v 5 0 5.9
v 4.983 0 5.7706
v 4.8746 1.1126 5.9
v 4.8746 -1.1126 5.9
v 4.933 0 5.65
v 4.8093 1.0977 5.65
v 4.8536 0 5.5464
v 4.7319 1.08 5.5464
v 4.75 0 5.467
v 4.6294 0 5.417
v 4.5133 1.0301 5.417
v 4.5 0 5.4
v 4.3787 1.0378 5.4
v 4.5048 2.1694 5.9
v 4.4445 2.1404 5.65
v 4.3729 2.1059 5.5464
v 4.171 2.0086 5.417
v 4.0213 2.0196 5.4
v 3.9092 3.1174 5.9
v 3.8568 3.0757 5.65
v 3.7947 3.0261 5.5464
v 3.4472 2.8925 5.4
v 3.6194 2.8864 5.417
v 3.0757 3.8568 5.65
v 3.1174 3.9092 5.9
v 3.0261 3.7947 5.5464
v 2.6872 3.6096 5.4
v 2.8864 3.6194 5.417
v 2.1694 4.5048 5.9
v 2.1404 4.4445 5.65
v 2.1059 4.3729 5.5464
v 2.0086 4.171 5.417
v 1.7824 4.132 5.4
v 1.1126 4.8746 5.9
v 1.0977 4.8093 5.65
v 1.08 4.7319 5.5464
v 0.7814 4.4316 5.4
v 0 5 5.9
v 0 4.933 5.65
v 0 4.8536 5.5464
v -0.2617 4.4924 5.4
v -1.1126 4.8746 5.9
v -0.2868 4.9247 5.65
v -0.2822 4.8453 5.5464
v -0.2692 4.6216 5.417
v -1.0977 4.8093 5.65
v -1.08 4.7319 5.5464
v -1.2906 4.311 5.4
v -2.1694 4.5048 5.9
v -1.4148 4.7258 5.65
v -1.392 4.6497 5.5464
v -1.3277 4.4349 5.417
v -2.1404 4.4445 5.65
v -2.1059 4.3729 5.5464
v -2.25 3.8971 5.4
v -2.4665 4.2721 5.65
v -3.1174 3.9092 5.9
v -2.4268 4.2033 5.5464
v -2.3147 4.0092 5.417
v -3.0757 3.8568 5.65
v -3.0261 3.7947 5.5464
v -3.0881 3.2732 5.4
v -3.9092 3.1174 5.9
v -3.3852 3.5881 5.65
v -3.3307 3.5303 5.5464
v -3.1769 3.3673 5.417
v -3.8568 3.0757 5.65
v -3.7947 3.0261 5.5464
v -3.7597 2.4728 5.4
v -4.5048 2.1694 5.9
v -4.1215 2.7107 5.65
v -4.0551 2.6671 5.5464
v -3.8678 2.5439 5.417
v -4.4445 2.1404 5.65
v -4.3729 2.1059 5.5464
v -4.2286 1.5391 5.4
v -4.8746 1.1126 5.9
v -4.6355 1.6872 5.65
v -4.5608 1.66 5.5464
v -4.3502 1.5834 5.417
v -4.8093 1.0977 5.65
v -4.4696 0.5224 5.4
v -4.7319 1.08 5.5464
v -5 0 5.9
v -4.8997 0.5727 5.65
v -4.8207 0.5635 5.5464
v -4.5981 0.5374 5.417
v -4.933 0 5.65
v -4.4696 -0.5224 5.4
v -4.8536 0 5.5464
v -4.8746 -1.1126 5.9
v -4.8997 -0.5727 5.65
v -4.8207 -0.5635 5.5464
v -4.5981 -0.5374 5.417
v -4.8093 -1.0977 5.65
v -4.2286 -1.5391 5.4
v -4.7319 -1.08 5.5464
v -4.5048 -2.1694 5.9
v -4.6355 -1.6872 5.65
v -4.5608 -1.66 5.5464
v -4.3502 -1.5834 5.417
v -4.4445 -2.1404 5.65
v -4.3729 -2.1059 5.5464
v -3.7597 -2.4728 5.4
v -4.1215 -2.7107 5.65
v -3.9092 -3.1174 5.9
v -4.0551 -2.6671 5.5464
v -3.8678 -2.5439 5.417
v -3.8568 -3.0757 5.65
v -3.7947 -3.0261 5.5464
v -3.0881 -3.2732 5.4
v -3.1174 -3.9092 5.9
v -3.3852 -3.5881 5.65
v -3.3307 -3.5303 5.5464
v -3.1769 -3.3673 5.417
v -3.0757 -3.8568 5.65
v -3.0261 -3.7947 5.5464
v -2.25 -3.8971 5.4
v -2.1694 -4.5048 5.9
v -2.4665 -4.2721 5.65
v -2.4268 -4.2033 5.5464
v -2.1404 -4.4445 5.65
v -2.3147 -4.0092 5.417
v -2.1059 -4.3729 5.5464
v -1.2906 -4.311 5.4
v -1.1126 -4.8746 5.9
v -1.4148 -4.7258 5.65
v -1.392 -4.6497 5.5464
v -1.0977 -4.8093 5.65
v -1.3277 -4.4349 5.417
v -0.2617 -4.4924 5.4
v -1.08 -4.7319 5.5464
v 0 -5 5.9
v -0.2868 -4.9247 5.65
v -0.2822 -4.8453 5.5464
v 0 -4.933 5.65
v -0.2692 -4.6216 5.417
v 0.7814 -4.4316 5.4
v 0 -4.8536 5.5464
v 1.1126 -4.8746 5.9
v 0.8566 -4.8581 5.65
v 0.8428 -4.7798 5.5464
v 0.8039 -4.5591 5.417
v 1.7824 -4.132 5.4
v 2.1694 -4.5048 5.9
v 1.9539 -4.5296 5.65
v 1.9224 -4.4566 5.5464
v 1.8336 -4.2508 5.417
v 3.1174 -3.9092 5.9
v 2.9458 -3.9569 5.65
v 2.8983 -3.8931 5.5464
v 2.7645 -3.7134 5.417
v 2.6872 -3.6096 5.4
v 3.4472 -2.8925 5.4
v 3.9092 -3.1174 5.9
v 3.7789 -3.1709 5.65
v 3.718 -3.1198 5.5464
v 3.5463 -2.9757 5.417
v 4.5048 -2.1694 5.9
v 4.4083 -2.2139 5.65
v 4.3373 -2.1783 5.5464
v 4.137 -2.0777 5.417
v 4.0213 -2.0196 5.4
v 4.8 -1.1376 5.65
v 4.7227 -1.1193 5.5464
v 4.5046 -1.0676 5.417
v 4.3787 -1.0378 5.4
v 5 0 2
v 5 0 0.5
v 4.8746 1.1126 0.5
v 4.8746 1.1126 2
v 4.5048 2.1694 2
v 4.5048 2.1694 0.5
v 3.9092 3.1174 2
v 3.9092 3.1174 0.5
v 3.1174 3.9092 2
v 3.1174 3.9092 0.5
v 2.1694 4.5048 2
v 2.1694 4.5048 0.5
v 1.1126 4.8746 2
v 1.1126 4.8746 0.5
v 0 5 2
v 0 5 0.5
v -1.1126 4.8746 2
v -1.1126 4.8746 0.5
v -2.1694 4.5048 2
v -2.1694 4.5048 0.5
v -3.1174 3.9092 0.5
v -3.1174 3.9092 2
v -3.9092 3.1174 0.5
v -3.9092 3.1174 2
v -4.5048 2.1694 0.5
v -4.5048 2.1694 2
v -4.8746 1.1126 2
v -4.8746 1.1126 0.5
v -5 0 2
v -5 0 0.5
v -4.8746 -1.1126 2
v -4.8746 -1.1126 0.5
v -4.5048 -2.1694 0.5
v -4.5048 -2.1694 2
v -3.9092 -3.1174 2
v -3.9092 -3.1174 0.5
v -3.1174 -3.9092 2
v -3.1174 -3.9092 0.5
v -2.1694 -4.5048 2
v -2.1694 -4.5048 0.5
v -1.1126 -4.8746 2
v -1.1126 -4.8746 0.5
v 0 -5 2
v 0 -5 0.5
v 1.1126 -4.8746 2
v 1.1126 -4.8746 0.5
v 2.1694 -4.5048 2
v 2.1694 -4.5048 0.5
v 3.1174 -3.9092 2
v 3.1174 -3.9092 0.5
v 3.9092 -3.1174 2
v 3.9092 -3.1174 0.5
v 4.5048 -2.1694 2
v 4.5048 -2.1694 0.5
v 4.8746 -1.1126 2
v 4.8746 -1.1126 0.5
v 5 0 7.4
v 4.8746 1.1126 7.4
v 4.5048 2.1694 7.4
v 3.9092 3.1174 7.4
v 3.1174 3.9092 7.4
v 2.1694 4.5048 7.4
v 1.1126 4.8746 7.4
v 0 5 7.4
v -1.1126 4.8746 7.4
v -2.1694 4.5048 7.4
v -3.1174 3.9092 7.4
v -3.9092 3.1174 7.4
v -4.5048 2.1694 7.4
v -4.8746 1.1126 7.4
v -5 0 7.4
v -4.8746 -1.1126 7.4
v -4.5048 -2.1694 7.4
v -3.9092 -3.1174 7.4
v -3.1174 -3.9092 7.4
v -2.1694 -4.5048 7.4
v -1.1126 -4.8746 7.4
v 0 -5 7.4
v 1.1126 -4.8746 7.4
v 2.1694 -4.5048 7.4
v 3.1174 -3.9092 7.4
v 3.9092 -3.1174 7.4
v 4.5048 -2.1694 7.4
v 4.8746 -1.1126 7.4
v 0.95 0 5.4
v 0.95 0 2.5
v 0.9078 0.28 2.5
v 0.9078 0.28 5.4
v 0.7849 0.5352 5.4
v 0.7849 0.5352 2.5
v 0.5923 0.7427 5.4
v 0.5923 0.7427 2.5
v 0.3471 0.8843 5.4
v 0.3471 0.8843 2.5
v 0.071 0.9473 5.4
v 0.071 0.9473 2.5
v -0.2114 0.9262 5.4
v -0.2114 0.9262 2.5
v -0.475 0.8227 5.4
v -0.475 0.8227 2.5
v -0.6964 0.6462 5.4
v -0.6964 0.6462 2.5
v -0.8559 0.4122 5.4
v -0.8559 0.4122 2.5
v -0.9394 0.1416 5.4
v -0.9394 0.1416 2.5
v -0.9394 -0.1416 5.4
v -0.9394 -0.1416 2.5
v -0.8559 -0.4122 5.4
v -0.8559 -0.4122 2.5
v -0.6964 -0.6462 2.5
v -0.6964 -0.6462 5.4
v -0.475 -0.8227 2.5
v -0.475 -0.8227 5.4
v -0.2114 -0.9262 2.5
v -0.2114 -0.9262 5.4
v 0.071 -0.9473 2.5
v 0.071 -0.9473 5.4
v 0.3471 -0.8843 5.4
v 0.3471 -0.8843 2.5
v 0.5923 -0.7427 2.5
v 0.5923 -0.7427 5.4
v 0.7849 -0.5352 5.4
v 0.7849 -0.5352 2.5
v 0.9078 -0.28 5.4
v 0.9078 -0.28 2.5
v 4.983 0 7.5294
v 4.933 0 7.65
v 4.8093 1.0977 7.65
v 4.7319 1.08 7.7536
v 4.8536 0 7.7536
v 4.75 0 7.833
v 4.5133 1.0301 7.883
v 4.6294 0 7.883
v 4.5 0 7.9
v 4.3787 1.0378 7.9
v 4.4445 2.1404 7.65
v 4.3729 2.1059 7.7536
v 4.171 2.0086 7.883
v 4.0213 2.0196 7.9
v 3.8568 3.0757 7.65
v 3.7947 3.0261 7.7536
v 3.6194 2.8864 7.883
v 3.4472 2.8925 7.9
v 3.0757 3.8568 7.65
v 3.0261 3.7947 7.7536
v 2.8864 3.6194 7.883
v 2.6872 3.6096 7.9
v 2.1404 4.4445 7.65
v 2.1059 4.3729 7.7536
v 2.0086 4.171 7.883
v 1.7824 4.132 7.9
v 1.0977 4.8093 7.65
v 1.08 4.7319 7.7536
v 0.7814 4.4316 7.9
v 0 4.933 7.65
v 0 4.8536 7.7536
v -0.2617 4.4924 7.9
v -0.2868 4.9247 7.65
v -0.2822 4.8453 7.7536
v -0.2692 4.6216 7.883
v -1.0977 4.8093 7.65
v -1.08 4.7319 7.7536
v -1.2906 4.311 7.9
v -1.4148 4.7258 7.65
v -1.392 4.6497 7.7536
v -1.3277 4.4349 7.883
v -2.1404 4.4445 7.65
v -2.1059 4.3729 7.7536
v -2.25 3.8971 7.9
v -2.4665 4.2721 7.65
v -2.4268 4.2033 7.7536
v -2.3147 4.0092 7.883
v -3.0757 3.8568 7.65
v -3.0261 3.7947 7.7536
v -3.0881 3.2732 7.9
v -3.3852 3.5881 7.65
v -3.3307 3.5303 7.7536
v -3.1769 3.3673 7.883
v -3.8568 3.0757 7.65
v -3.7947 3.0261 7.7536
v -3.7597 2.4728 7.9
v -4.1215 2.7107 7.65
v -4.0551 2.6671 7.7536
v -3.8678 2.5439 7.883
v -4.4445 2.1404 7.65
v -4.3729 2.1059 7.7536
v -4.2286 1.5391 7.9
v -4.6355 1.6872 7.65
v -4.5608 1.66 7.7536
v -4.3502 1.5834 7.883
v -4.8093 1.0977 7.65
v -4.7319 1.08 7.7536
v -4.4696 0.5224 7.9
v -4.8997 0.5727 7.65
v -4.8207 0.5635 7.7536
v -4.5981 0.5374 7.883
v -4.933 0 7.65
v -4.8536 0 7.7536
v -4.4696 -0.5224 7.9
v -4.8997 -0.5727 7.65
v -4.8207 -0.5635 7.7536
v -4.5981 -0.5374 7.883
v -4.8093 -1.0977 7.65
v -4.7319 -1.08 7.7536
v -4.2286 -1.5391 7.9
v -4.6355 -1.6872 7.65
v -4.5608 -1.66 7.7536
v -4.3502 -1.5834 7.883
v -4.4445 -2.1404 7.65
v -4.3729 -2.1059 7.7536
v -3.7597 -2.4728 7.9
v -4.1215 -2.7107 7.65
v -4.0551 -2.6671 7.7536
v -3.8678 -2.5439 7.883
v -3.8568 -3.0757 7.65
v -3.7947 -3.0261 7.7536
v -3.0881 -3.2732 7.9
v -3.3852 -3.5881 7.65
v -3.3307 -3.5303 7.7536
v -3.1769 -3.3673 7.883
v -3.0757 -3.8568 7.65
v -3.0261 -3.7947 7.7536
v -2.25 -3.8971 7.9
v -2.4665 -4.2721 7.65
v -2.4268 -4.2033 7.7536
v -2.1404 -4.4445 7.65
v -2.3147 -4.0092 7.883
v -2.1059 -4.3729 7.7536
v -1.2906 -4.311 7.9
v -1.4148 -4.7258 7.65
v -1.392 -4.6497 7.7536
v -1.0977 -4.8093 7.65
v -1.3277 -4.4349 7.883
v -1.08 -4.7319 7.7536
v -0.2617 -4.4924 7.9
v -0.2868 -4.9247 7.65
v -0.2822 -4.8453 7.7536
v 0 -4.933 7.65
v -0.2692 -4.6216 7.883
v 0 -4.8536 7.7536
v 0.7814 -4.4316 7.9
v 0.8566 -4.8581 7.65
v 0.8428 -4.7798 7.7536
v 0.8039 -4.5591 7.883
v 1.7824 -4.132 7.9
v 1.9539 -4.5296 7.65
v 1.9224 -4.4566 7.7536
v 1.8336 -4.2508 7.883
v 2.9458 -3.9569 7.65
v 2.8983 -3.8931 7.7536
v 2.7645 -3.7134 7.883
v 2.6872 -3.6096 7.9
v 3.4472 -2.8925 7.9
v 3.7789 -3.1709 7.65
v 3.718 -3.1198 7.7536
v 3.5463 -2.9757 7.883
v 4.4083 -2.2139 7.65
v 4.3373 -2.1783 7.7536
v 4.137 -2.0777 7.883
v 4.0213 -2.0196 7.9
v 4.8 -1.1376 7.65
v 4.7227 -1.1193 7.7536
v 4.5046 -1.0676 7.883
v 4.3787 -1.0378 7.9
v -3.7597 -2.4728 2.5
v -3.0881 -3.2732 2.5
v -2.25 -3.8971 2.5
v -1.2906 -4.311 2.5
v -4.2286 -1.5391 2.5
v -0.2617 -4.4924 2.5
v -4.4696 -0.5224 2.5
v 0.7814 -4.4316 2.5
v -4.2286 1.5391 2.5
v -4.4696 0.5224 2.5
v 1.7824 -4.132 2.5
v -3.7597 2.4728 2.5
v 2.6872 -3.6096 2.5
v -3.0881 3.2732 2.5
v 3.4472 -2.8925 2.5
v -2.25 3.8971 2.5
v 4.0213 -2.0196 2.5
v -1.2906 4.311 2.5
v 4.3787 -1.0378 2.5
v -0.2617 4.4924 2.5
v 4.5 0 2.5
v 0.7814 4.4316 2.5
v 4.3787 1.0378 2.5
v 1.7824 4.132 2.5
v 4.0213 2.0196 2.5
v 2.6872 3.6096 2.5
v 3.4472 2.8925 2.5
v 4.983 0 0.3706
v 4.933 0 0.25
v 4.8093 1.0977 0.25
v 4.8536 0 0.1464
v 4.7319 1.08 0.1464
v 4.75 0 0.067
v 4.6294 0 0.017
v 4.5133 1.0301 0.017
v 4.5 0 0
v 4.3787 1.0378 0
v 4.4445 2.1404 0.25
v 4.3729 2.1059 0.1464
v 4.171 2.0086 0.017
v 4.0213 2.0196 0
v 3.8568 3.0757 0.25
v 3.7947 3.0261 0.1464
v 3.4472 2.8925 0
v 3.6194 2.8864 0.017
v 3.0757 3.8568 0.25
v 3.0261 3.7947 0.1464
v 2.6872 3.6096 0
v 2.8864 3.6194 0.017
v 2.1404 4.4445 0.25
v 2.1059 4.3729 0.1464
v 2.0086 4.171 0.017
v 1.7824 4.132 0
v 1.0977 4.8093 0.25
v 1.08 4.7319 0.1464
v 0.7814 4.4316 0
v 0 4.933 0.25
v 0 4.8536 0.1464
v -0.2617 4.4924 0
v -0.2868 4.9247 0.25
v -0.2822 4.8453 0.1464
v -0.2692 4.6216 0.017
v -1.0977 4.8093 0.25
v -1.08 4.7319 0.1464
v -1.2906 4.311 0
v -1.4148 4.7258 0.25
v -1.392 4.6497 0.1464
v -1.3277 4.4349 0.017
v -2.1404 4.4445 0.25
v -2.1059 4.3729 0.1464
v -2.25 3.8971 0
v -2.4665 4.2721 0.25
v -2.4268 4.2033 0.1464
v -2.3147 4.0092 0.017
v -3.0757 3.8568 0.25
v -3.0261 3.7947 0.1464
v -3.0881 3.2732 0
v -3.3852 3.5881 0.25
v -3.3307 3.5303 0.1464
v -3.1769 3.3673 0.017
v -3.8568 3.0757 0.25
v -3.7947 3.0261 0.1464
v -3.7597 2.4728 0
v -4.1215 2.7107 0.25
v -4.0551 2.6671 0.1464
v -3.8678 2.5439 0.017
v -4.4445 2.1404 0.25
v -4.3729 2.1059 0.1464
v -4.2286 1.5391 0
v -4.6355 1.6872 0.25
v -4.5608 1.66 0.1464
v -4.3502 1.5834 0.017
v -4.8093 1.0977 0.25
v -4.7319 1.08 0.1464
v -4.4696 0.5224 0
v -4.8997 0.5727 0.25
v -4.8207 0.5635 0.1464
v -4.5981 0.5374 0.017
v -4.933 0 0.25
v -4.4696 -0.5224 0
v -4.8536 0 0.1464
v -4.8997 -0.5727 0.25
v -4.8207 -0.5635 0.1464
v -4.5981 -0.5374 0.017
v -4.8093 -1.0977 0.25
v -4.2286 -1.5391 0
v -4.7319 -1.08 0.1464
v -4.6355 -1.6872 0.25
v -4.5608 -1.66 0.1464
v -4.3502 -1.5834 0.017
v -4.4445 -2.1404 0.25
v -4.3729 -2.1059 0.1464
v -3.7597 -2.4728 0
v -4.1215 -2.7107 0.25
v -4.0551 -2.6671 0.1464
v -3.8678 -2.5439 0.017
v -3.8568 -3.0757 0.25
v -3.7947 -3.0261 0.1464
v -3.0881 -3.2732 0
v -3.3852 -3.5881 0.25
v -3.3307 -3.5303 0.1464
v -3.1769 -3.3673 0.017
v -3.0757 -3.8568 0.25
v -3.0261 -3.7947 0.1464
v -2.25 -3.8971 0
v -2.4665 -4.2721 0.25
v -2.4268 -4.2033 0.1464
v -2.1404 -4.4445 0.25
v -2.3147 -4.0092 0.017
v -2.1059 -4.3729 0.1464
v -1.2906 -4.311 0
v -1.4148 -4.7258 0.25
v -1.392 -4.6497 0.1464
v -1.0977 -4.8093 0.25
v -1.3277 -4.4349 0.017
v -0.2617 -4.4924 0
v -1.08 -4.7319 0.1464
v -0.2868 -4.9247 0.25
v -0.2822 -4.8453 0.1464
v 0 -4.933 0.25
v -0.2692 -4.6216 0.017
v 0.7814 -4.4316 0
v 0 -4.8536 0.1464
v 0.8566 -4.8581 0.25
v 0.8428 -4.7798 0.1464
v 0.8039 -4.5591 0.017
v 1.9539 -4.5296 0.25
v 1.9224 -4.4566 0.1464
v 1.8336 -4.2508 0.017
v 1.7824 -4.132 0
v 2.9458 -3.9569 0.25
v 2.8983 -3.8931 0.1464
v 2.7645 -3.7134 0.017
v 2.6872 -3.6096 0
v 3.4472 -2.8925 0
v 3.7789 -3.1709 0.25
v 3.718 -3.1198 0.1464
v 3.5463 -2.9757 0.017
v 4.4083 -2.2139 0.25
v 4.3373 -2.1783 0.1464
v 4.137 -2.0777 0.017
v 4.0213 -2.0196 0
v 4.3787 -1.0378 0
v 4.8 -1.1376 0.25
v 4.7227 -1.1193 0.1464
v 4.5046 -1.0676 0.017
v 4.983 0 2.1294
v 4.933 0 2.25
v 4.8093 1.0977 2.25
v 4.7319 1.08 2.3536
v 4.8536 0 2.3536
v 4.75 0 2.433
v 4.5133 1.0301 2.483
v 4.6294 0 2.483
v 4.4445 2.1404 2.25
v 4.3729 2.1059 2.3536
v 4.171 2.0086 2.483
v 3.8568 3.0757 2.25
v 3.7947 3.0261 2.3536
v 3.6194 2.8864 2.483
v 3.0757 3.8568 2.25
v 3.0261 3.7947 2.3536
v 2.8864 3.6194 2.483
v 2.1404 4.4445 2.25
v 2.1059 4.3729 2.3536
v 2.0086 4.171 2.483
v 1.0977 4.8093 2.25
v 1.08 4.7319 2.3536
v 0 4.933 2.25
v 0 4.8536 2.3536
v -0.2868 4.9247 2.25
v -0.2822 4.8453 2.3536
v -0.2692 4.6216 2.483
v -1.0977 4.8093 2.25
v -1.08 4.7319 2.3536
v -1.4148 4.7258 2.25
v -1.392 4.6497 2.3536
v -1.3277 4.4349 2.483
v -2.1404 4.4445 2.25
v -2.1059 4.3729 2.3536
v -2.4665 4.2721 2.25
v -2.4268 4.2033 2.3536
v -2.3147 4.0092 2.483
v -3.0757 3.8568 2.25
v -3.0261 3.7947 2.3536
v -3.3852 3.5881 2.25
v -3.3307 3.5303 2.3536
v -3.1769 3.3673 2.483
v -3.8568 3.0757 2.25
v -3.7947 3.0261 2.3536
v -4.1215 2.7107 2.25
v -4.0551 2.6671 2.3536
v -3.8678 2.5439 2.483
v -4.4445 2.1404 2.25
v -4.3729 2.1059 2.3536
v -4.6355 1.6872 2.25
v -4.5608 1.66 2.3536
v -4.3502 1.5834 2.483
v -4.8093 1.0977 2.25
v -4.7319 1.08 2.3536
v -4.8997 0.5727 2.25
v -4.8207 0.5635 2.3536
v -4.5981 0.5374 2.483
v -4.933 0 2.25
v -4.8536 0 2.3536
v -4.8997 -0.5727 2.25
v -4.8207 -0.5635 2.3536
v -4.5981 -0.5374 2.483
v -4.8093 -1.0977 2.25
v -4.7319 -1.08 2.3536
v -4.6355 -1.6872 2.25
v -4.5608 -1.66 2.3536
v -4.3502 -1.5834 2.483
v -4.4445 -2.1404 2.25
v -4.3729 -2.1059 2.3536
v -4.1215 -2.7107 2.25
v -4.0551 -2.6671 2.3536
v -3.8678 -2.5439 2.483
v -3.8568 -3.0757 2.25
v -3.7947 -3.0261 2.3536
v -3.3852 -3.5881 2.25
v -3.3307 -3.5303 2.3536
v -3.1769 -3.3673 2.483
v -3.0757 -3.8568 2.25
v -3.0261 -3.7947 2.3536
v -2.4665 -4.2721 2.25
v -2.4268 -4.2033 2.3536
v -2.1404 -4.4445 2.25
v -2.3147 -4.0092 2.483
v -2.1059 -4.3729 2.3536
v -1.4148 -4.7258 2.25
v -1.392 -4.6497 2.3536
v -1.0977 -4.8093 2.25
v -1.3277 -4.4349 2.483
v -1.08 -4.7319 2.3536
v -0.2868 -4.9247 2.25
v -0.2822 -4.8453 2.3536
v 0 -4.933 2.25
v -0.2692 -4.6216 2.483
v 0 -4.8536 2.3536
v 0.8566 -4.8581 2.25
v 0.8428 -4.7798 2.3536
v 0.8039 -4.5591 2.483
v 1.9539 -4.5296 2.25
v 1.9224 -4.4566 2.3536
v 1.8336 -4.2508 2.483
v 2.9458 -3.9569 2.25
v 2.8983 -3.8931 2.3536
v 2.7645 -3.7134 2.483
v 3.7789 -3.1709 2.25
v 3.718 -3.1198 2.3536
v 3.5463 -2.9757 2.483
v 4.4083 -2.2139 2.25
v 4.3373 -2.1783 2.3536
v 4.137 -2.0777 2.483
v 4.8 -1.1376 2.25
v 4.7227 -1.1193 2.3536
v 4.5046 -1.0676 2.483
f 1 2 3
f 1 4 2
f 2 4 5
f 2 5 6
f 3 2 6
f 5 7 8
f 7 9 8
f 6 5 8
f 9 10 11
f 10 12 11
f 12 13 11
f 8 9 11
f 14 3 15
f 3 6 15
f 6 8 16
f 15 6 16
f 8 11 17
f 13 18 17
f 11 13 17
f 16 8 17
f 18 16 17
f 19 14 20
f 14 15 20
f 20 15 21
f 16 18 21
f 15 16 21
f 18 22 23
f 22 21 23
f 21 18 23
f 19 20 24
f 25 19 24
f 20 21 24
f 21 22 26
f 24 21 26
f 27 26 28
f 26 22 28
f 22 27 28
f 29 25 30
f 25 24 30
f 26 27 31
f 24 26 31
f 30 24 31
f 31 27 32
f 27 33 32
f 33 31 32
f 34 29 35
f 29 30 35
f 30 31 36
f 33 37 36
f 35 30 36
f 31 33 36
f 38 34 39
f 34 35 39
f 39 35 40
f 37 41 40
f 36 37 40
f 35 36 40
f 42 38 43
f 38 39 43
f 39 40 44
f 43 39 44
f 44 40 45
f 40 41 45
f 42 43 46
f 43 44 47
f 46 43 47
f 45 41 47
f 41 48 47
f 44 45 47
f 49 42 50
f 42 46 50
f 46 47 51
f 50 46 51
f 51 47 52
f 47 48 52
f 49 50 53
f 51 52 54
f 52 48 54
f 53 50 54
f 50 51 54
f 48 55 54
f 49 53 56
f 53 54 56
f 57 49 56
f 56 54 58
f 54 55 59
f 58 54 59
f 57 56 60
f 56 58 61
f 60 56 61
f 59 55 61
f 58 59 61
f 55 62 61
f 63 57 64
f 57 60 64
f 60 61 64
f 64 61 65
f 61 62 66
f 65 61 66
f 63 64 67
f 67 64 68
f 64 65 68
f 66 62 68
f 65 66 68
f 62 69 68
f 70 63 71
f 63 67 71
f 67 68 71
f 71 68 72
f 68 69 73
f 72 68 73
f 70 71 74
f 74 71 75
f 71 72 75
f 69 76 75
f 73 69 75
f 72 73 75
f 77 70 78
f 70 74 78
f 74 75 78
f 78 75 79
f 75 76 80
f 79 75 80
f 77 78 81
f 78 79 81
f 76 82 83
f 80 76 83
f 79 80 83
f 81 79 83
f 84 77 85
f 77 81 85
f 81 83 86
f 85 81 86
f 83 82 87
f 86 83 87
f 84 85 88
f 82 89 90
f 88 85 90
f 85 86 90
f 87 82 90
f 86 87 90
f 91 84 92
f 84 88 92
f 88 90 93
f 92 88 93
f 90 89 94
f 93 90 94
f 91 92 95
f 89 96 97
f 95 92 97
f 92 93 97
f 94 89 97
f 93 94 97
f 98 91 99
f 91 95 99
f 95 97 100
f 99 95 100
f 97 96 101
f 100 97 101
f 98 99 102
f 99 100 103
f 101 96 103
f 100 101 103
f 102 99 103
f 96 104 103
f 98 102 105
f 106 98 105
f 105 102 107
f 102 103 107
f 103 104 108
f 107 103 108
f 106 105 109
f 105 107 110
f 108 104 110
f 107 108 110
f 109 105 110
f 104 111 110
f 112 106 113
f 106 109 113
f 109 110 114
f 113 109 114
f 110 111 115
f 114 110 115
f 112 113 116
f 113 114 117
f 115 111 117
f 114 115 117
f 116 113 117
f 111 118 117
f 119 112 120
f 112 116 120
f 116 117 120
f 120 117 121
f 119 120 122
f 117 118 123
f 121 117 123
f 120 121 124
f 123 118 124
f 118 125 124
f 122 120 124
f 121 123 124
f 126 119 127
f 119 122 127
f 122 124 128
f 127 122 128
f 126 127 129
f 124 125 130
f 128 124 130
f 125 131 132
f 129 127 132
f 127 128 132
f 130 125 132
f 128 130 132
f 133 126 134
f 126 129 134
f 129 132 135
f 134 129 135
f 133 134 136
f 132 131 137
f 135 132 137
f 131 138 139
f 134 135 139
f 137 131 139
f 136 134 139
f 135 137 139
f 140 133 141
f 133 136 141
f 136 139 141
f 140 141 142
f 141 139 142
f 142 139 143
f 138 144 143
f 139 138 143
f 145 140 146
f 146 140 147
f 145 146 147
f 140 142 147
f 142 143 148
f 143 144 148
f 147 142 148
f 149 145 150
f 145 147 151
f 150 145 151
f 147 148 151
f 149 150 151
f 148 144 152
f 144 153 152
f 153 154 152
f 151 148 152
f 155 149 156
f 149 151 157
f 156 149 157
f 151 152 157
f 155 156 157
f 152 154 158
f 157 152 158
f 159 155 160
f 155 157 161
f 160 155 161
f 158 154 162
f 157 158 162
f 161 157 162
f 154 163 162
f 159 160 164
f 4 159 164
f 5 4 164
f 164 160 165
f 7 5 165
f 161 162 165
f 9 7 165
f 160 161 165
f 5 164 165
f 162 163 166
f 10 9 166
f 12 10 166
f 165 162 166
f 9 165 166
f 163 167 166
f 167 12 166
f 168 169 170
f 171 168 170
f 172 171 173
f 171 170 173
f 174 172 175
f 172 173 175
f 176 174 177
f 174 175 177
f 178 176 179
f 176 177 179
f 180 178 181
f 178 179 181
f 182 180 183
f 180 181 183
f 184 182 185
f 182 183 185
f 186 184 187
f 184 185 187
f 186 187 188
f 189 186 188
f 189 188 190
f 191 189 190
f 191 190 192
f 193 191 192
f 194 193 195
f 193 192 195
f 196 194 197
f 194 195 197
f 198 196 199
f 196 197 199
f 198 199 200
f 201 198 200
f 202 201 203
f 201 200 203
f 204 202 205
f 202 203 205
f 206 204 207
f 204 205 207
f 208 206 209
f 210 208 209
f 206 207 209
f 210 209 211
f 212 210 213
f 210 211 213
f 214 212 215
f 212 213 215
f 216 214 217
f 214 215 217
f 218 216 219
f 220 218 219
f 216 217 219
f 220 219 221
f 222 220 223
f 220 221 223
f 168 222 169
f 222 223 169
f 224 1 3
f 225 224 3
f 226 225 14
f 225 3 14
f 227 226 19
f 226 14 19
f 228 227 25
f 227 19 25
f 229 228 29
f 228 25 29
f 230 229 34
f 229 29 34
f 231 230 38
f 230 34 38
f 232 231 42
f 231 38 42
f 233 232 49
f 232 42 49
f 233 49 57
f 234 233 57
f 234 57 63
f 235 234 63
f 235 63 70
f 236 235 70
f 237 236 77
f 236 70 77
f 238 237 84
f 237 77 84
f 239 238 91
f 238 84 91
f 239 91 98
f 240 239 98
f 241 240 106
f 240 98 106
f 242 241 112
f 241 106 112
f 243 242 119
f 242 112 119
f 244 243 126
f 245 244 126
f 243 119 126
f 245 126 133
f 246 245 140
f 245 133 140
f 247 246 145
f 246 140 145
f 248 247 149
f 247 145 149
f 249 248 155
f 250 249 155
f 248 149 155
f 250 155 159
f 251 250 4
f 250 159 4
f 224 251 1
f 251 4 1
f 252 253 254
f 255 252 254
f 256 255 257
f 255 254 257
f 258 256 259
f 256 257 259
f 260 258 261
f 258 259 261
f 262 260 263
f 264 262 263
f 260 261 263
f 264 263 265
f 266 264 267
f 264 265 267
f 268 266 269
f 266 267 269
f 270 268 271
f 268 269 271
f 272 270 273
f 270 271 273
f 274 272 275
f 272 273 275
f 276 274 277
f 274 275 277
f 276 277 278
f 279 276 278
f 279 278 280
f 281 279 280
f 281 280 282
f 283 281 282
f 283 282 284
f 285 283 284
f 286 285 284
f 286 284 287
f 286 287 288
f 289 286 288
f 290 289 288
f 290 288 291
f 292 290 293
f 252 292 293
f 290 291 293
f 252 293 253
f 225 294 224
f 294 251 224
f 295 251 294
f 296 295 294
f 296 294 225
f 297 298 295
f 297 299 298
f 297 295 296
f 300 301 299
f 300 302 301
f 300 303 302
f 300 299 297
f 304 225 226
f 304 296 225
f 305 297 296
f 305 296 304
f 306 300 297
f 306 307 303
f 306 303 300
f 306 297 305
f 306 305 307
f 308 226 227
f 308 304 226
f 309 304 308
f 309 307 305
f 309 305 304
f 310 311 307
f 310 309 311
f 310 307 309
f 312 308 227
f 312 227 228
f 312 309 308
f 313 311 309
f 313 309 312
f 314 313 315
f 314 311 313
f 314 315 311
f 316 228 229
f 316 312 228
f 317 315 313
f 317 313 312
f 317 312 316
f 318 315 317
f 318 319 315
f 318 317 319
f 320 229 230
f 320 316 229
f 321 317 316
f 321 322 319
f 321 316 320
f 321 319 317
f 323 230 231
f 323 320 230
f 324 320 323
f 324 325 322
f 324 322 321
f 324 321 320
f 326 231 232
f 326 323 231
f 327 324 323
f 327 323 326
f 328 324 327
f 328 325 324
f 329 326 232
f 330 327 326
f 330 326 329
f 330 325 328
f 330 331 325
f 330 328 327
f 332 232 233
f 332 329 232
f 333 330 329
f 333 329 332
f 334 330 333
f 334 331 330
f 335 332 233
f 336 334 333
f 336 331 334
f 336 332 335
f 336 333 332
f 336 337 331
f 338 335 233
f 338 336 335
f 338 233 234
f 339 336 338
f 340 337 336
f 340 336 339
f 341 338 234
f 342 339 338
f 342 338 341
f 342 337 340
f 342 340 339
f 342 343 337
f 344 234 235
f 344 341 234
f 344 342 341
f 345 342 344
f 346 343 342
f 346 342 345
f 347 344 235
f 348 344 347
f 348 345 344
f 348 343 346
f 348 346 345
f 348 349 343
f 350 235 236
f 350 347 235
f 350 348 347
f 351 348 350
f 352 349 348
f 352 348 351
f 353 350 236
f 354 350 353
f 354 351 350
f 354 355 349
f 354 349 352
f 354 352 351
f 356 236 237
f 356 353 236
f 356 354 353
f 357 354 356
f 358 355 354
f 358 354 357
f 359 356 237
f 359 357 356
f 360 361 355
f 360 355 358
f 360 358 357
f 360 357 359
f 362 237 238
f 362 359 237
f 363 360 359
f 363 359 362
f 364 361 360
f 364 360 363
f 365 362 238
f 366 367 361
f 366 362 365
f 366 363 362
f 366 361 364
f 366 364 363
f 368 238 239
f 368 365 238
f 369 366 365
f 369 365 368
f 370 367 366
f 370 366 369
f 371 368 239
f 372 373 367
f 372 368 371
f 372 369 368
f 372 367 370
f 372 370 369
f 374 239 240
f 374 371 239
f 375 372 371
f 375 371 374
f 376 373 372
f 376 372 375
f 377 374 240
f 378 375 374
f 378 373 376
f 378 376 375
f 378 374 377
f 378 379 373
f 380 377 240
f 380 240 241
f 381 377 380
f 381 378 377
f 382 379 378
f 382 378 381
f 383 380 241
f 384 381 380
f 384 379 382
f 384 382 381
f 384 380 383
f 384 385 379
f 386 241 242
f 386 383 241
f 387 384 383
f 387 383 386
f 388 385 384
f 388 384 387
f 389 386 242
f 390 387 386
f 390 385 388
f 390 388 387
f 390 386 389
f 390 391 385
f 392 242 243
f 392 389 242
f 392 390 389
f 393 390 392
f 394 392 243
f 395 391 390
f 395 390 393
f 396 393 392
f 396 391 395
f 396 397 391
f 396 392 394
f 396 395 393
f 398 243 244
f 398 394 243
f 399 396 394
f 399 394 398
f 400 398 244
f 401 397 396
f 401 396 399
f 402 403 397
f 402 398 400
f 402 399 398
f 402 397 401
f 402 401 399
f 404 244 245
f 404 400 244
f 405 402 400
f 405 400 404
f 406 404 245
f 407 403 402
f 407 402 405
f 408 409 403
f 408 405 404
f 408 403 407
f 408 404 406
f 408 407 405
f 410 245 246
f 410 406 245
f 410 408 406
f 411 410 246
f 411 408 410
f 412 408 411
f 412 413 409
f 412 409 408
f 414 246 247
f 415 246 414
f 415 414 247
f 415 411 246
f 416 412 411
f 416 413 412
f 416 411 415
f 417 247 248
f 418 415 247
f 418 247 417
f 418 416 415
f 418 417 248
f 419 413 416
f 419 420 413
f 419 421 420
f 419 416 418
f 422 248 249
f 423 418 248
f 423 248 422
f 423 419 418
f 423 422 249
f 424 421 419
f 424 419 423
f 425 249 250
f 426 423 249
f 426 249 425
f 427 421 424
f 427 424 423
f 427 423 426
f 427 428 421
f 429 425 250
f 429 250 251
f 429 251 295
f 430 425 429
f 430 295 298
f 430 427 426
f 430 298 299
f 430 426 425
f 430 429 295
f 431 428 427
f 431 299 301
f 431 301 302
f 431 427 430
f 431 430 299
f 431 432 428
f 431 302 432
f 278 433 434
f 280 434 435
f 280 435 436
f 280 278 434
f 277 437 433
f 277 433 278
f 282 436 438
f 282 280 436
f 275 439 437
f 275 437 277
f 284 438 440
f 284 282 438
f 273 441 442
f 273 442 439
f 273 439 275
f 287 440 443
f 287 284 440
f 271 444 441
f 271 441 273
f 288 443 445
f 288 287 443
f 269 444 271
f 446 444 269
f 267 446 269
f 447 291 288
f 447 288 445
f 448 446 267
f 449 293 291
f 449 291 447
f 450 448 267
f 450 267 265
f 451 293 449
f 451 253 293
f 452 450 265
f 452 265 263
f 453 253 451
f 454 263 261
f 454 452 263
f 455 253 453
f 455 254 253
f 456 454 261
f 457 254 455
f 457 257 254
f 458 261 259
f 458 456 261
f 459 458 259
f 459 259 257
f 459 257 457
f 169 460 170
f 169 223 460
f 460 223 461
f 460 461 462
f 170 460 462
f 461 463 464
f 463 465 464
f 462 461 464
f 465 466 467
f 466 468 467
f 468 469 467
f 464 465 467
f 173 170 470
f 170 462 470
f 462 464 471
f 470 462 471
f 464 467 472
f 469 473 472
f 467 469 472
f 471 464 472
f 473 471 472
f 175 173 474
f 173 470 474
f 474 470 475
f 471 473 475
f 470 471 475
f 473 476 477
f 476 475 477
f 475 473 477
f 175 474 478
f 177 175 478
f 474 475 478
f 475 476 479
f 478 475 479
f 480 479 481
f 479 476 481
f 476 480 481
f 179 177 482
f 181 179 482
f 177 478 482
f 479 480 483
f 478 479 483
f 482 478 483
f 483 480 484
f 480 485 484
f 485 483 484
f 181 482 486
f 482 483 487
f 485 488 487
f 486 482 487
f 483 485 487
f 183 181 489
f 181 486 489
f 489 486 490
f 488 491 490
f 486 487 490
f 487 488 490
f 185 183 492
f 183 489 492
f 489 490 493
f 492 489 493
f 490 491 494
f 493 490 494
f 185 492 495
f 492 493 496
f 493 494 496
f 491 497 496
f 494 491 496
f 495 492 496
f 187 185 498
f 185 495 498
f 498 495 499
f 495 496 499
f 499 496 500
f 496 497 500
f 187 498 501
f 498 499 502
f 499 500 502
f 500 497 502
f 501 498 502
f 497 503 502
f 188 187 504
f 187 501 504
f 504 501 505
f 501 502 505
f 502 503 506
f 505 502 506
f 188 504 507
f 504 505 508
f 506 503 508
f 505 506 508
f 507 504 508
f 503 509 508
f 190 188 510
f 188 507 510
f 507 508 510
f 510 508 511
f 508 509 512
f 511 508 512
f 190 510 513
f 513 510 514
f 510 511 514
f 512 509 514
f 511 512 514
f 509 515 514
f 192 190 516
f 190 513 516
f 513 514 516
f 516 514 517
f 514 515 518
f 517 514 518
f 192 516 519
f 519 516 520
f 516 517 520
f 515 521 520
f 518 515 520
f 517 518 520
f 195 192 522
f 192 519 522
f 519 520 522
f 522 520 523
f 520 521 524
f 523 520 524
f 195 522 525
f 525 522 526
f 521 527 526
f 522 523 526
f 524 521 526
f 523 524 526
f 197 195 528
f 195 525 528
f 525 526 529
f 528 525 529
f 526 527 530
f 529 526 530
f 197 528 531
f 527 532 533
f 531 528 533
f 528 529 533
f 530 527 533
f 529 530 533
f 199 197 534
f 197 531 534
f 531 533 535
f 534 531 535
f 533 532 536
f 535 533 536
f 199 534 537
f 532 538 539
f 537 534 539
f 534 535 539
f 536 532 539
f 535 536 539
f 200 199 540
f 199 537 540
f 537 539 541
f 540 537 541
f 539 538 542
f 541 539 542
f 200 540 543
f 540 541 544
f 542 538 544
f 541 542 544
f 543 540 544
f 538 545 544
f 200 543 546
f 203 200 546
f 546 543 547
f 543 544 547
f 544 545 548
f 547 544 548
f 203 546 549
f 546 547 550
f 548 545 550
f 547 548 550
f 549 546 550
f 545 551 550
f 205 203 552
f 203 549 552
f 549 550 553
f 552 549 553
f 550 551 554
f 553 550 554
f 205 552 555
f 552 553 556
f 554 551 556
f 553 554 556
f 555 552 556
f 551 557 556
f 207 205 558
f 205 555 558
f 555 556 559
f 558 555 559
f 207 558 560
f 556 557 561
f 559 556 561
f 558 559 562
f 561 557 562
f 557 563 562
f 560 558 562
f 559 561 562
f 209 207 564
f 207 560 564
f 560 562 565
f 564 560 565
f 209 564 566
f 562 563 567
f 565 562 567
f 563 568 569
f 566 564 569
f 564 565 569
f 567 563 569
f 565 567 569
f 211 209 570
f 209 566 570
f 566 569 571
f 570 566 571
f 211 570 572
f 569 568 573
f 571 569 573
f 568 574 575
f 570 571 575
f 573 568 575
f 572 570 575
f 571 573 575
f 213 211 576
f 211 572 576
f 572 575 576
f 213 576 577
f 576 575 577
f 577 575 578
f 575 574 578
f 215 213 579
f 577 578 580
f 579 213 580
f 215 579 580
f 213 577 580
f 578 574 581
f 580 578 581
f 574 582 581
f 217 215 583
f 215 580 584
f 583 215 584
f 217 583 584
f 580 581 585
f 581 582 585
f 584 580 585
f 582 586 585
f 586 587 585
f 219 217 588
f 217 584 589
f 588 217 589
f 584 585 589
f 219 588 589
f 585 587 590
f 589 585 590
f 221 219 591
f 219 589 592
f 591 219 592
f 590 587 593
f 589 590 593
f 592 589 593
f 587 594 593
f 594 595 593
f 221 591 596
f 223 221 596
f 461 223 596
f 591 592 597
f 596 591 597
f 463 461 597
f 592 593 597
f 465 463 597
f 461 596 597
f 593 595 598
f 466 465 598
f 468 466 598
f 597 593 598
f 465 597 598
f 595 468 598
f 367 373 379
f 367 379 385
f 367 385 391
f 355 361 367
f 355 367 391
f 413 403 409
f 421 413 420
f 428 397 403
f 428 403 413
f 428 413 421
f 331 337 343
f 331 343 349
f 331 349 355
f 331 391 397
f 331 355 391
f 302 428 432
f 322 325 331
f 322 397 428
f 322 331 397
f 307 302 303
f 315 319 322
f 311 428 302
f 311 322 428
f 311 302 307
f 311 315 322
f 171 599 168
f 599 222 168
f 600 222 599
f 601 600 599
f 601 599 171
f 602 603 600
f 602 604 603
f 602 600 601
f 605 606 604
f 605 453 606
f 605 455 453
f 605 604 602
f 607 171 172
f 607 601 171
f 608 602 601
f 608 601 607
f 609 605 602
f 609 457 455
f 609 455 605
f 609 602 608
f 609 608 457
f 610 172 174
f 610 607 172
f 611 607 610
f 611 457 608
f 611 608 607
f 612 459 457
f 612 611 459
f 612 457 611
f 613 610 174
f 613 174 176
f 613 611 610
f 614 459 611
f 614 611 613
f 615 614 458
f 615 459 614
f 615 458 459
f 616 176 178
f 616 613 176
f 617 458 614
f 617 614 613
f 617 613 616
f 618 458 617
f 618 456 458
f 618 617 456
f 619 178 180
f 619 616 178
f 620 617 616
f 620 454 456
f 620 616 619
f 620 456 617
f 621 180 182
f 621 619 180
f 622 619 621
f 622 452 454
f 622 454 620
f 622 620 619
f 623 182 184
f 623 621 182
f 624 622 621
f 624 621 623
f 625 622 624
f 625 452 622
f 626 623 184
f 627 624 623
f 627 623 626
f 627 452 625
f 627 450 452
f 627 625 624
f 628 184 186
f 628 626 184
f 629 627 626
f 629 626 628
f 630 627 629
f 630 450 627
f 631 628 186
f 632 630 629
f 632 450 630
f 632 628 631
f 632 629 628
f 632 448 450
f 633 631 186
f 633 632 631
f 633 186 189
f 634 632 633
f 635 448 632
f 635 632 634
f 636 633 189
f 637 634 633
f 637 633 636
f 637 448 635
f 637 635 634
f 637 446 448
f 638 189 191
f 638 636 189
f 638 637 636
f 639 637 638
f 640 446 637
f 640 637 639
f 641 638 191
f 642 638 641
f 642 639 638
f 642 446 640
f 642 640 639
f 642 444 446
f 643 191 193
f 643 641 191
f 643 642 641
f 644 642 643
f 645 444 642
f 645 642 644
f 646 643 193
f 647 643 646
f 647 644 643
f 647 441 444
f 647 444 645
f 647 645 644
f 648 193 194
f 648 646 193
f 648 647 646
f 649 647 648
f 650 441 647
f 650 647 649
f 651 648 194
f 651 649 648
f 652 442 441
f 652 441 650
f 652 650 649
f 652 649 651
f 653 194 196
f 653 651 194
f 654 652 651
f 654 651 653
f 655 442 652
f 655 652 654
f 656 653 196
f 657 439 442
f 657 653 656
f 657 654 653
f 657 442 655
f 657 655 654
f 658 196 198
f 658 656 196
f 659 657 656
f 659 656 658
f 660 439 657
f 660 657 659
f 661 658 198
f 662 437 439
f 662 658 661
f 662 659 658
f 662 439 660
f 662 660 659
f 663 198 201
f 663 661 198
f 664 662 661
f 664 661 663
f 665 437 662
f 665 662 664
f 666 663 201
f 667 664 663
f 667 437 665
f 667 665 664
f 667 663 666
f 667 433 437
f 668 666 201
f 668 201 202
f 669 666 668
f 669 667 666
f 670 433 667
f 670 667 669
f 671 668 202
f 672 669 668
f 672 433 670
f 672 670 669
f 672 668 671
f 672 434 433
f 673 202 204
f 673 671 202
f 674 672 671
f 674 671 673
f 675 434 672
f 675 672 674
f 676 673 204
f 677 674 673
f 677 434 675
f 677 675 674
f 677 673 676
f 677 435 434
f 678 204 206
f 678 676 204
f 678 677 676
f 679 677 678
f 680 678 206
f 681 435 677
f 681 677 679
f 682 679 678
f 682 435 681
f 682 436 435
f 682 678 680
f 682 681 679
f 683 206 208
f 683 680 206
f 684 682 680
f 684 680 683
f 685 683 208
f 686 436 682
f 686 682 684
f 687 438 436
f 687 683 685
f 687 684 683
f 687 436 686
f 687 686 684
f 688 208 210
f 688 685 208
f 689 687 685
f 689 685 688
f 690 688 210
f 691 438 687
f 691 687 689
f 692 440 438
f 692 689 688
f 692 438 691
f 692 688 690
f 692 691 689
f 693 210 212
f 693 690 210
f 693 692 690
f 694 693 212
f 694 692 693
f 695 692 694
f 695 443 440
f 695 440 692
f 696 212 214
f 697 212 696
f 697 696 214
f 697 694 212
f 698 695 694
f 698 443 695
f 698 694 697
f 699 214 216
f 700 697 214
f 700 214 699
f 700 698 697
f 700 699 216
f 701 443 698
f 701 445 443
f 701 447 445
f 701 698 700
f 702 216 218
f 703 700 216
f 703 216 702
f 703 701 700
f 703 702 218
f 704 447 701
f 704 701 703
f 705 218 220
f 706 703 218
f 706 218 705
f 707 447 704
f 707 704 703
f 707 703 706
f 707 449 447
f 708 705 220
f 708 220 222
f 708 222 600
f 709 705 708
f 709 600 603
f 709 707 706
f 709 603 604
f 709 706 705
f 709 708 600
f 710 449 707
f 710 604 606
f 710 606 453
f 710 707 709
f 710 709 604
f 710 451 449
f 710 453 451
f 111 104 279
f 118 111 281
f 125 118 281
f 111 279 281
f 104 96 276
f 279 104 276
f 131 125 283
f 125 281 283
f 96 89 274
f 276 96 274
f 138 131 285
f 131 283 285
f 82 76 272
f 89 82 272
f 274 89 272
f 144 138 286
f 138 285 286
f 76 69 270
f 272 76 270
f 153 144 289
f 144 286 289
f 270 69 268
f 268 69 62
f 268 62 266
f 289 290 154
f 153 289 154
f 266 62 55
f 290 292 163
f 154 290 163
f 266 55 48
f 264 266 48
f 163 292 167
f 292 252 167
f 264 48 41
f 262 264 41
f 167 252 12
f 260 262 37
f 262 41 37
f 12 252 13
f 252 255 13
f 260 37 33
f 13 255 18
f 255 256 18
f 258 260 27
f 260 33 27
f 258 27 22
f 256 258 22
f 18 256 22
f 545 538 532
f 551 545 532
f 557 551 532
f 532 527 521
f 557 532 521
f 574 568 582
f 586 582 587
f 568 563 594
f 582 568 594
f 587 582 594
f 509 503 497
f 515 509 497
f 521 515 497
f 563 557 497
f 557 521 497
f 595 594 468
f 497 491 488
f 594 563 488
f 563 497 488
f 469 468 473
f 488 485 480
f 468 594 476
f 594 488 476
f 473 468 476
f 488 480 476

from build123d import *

# Parameters (mm, degrees)
SKETCH1_R           = 5
BOSS_EXTRUDE1_DEPTH = 2.5
FILLET1_R           = 0.5
FILLET2_R           = 0.5
SKETCH2_R           = 0.95
BOSS_EXTRUDE2_DEPTH = 2.9
SKETCH3_R           = 5
BOSS_EXTRUDE3_DEPTH = 2.5
FILLET3_R           = 0.5


with BuildPart() as part:
    # Sketch1 → Boss-Extrude1 (new body)
    with BuildSketch(Plane.XY):
        Circle(SKETCH1_R)
    extrude(amount=BOSS_EXTRUDE1_DEPTH)

    # Fillet1
    fillet1_edges = [part.edges().sort_by_distance(p)[0] for p in [
        (-5, 0, 0),
    ]]
    fillet(fillet1_edges, radius=FILLET1_R)

    # Fillet2
    fillet2_edges = [part.edges().sort_by_distance(p)[0] for p in [
        (-5, 0, 2.5),
    ]]
    fillet(fillet2_edges, radius=FILLET2_R)

    # Sketch2 → Boss-Extrude2 (add)
    with BuildSketch(Plane.XY.offset(2.5)):
        Circle(SKETCH2_R)
    extrude(amount=BOSS_EXTRUDE2_DEPTH)

    # Sketch3 → Boss-Extrude3 (add)
    with BuildSketch(Plane.XY.offset(5.4)):
        Circle(SKETCH3_R)
    extrude(amount=BOSS_EXTRUDE3_DEPTH)

    # Fillet3
    fillet3_edges = [part.edges().sort_by_distance(p)[0] for p in [
        (-5, 0, 5.4),
        (-5, 0, 7.9),
    ]]
    fillet(fillet3_edges, radius=FILLET3_R)


solid = part.part
